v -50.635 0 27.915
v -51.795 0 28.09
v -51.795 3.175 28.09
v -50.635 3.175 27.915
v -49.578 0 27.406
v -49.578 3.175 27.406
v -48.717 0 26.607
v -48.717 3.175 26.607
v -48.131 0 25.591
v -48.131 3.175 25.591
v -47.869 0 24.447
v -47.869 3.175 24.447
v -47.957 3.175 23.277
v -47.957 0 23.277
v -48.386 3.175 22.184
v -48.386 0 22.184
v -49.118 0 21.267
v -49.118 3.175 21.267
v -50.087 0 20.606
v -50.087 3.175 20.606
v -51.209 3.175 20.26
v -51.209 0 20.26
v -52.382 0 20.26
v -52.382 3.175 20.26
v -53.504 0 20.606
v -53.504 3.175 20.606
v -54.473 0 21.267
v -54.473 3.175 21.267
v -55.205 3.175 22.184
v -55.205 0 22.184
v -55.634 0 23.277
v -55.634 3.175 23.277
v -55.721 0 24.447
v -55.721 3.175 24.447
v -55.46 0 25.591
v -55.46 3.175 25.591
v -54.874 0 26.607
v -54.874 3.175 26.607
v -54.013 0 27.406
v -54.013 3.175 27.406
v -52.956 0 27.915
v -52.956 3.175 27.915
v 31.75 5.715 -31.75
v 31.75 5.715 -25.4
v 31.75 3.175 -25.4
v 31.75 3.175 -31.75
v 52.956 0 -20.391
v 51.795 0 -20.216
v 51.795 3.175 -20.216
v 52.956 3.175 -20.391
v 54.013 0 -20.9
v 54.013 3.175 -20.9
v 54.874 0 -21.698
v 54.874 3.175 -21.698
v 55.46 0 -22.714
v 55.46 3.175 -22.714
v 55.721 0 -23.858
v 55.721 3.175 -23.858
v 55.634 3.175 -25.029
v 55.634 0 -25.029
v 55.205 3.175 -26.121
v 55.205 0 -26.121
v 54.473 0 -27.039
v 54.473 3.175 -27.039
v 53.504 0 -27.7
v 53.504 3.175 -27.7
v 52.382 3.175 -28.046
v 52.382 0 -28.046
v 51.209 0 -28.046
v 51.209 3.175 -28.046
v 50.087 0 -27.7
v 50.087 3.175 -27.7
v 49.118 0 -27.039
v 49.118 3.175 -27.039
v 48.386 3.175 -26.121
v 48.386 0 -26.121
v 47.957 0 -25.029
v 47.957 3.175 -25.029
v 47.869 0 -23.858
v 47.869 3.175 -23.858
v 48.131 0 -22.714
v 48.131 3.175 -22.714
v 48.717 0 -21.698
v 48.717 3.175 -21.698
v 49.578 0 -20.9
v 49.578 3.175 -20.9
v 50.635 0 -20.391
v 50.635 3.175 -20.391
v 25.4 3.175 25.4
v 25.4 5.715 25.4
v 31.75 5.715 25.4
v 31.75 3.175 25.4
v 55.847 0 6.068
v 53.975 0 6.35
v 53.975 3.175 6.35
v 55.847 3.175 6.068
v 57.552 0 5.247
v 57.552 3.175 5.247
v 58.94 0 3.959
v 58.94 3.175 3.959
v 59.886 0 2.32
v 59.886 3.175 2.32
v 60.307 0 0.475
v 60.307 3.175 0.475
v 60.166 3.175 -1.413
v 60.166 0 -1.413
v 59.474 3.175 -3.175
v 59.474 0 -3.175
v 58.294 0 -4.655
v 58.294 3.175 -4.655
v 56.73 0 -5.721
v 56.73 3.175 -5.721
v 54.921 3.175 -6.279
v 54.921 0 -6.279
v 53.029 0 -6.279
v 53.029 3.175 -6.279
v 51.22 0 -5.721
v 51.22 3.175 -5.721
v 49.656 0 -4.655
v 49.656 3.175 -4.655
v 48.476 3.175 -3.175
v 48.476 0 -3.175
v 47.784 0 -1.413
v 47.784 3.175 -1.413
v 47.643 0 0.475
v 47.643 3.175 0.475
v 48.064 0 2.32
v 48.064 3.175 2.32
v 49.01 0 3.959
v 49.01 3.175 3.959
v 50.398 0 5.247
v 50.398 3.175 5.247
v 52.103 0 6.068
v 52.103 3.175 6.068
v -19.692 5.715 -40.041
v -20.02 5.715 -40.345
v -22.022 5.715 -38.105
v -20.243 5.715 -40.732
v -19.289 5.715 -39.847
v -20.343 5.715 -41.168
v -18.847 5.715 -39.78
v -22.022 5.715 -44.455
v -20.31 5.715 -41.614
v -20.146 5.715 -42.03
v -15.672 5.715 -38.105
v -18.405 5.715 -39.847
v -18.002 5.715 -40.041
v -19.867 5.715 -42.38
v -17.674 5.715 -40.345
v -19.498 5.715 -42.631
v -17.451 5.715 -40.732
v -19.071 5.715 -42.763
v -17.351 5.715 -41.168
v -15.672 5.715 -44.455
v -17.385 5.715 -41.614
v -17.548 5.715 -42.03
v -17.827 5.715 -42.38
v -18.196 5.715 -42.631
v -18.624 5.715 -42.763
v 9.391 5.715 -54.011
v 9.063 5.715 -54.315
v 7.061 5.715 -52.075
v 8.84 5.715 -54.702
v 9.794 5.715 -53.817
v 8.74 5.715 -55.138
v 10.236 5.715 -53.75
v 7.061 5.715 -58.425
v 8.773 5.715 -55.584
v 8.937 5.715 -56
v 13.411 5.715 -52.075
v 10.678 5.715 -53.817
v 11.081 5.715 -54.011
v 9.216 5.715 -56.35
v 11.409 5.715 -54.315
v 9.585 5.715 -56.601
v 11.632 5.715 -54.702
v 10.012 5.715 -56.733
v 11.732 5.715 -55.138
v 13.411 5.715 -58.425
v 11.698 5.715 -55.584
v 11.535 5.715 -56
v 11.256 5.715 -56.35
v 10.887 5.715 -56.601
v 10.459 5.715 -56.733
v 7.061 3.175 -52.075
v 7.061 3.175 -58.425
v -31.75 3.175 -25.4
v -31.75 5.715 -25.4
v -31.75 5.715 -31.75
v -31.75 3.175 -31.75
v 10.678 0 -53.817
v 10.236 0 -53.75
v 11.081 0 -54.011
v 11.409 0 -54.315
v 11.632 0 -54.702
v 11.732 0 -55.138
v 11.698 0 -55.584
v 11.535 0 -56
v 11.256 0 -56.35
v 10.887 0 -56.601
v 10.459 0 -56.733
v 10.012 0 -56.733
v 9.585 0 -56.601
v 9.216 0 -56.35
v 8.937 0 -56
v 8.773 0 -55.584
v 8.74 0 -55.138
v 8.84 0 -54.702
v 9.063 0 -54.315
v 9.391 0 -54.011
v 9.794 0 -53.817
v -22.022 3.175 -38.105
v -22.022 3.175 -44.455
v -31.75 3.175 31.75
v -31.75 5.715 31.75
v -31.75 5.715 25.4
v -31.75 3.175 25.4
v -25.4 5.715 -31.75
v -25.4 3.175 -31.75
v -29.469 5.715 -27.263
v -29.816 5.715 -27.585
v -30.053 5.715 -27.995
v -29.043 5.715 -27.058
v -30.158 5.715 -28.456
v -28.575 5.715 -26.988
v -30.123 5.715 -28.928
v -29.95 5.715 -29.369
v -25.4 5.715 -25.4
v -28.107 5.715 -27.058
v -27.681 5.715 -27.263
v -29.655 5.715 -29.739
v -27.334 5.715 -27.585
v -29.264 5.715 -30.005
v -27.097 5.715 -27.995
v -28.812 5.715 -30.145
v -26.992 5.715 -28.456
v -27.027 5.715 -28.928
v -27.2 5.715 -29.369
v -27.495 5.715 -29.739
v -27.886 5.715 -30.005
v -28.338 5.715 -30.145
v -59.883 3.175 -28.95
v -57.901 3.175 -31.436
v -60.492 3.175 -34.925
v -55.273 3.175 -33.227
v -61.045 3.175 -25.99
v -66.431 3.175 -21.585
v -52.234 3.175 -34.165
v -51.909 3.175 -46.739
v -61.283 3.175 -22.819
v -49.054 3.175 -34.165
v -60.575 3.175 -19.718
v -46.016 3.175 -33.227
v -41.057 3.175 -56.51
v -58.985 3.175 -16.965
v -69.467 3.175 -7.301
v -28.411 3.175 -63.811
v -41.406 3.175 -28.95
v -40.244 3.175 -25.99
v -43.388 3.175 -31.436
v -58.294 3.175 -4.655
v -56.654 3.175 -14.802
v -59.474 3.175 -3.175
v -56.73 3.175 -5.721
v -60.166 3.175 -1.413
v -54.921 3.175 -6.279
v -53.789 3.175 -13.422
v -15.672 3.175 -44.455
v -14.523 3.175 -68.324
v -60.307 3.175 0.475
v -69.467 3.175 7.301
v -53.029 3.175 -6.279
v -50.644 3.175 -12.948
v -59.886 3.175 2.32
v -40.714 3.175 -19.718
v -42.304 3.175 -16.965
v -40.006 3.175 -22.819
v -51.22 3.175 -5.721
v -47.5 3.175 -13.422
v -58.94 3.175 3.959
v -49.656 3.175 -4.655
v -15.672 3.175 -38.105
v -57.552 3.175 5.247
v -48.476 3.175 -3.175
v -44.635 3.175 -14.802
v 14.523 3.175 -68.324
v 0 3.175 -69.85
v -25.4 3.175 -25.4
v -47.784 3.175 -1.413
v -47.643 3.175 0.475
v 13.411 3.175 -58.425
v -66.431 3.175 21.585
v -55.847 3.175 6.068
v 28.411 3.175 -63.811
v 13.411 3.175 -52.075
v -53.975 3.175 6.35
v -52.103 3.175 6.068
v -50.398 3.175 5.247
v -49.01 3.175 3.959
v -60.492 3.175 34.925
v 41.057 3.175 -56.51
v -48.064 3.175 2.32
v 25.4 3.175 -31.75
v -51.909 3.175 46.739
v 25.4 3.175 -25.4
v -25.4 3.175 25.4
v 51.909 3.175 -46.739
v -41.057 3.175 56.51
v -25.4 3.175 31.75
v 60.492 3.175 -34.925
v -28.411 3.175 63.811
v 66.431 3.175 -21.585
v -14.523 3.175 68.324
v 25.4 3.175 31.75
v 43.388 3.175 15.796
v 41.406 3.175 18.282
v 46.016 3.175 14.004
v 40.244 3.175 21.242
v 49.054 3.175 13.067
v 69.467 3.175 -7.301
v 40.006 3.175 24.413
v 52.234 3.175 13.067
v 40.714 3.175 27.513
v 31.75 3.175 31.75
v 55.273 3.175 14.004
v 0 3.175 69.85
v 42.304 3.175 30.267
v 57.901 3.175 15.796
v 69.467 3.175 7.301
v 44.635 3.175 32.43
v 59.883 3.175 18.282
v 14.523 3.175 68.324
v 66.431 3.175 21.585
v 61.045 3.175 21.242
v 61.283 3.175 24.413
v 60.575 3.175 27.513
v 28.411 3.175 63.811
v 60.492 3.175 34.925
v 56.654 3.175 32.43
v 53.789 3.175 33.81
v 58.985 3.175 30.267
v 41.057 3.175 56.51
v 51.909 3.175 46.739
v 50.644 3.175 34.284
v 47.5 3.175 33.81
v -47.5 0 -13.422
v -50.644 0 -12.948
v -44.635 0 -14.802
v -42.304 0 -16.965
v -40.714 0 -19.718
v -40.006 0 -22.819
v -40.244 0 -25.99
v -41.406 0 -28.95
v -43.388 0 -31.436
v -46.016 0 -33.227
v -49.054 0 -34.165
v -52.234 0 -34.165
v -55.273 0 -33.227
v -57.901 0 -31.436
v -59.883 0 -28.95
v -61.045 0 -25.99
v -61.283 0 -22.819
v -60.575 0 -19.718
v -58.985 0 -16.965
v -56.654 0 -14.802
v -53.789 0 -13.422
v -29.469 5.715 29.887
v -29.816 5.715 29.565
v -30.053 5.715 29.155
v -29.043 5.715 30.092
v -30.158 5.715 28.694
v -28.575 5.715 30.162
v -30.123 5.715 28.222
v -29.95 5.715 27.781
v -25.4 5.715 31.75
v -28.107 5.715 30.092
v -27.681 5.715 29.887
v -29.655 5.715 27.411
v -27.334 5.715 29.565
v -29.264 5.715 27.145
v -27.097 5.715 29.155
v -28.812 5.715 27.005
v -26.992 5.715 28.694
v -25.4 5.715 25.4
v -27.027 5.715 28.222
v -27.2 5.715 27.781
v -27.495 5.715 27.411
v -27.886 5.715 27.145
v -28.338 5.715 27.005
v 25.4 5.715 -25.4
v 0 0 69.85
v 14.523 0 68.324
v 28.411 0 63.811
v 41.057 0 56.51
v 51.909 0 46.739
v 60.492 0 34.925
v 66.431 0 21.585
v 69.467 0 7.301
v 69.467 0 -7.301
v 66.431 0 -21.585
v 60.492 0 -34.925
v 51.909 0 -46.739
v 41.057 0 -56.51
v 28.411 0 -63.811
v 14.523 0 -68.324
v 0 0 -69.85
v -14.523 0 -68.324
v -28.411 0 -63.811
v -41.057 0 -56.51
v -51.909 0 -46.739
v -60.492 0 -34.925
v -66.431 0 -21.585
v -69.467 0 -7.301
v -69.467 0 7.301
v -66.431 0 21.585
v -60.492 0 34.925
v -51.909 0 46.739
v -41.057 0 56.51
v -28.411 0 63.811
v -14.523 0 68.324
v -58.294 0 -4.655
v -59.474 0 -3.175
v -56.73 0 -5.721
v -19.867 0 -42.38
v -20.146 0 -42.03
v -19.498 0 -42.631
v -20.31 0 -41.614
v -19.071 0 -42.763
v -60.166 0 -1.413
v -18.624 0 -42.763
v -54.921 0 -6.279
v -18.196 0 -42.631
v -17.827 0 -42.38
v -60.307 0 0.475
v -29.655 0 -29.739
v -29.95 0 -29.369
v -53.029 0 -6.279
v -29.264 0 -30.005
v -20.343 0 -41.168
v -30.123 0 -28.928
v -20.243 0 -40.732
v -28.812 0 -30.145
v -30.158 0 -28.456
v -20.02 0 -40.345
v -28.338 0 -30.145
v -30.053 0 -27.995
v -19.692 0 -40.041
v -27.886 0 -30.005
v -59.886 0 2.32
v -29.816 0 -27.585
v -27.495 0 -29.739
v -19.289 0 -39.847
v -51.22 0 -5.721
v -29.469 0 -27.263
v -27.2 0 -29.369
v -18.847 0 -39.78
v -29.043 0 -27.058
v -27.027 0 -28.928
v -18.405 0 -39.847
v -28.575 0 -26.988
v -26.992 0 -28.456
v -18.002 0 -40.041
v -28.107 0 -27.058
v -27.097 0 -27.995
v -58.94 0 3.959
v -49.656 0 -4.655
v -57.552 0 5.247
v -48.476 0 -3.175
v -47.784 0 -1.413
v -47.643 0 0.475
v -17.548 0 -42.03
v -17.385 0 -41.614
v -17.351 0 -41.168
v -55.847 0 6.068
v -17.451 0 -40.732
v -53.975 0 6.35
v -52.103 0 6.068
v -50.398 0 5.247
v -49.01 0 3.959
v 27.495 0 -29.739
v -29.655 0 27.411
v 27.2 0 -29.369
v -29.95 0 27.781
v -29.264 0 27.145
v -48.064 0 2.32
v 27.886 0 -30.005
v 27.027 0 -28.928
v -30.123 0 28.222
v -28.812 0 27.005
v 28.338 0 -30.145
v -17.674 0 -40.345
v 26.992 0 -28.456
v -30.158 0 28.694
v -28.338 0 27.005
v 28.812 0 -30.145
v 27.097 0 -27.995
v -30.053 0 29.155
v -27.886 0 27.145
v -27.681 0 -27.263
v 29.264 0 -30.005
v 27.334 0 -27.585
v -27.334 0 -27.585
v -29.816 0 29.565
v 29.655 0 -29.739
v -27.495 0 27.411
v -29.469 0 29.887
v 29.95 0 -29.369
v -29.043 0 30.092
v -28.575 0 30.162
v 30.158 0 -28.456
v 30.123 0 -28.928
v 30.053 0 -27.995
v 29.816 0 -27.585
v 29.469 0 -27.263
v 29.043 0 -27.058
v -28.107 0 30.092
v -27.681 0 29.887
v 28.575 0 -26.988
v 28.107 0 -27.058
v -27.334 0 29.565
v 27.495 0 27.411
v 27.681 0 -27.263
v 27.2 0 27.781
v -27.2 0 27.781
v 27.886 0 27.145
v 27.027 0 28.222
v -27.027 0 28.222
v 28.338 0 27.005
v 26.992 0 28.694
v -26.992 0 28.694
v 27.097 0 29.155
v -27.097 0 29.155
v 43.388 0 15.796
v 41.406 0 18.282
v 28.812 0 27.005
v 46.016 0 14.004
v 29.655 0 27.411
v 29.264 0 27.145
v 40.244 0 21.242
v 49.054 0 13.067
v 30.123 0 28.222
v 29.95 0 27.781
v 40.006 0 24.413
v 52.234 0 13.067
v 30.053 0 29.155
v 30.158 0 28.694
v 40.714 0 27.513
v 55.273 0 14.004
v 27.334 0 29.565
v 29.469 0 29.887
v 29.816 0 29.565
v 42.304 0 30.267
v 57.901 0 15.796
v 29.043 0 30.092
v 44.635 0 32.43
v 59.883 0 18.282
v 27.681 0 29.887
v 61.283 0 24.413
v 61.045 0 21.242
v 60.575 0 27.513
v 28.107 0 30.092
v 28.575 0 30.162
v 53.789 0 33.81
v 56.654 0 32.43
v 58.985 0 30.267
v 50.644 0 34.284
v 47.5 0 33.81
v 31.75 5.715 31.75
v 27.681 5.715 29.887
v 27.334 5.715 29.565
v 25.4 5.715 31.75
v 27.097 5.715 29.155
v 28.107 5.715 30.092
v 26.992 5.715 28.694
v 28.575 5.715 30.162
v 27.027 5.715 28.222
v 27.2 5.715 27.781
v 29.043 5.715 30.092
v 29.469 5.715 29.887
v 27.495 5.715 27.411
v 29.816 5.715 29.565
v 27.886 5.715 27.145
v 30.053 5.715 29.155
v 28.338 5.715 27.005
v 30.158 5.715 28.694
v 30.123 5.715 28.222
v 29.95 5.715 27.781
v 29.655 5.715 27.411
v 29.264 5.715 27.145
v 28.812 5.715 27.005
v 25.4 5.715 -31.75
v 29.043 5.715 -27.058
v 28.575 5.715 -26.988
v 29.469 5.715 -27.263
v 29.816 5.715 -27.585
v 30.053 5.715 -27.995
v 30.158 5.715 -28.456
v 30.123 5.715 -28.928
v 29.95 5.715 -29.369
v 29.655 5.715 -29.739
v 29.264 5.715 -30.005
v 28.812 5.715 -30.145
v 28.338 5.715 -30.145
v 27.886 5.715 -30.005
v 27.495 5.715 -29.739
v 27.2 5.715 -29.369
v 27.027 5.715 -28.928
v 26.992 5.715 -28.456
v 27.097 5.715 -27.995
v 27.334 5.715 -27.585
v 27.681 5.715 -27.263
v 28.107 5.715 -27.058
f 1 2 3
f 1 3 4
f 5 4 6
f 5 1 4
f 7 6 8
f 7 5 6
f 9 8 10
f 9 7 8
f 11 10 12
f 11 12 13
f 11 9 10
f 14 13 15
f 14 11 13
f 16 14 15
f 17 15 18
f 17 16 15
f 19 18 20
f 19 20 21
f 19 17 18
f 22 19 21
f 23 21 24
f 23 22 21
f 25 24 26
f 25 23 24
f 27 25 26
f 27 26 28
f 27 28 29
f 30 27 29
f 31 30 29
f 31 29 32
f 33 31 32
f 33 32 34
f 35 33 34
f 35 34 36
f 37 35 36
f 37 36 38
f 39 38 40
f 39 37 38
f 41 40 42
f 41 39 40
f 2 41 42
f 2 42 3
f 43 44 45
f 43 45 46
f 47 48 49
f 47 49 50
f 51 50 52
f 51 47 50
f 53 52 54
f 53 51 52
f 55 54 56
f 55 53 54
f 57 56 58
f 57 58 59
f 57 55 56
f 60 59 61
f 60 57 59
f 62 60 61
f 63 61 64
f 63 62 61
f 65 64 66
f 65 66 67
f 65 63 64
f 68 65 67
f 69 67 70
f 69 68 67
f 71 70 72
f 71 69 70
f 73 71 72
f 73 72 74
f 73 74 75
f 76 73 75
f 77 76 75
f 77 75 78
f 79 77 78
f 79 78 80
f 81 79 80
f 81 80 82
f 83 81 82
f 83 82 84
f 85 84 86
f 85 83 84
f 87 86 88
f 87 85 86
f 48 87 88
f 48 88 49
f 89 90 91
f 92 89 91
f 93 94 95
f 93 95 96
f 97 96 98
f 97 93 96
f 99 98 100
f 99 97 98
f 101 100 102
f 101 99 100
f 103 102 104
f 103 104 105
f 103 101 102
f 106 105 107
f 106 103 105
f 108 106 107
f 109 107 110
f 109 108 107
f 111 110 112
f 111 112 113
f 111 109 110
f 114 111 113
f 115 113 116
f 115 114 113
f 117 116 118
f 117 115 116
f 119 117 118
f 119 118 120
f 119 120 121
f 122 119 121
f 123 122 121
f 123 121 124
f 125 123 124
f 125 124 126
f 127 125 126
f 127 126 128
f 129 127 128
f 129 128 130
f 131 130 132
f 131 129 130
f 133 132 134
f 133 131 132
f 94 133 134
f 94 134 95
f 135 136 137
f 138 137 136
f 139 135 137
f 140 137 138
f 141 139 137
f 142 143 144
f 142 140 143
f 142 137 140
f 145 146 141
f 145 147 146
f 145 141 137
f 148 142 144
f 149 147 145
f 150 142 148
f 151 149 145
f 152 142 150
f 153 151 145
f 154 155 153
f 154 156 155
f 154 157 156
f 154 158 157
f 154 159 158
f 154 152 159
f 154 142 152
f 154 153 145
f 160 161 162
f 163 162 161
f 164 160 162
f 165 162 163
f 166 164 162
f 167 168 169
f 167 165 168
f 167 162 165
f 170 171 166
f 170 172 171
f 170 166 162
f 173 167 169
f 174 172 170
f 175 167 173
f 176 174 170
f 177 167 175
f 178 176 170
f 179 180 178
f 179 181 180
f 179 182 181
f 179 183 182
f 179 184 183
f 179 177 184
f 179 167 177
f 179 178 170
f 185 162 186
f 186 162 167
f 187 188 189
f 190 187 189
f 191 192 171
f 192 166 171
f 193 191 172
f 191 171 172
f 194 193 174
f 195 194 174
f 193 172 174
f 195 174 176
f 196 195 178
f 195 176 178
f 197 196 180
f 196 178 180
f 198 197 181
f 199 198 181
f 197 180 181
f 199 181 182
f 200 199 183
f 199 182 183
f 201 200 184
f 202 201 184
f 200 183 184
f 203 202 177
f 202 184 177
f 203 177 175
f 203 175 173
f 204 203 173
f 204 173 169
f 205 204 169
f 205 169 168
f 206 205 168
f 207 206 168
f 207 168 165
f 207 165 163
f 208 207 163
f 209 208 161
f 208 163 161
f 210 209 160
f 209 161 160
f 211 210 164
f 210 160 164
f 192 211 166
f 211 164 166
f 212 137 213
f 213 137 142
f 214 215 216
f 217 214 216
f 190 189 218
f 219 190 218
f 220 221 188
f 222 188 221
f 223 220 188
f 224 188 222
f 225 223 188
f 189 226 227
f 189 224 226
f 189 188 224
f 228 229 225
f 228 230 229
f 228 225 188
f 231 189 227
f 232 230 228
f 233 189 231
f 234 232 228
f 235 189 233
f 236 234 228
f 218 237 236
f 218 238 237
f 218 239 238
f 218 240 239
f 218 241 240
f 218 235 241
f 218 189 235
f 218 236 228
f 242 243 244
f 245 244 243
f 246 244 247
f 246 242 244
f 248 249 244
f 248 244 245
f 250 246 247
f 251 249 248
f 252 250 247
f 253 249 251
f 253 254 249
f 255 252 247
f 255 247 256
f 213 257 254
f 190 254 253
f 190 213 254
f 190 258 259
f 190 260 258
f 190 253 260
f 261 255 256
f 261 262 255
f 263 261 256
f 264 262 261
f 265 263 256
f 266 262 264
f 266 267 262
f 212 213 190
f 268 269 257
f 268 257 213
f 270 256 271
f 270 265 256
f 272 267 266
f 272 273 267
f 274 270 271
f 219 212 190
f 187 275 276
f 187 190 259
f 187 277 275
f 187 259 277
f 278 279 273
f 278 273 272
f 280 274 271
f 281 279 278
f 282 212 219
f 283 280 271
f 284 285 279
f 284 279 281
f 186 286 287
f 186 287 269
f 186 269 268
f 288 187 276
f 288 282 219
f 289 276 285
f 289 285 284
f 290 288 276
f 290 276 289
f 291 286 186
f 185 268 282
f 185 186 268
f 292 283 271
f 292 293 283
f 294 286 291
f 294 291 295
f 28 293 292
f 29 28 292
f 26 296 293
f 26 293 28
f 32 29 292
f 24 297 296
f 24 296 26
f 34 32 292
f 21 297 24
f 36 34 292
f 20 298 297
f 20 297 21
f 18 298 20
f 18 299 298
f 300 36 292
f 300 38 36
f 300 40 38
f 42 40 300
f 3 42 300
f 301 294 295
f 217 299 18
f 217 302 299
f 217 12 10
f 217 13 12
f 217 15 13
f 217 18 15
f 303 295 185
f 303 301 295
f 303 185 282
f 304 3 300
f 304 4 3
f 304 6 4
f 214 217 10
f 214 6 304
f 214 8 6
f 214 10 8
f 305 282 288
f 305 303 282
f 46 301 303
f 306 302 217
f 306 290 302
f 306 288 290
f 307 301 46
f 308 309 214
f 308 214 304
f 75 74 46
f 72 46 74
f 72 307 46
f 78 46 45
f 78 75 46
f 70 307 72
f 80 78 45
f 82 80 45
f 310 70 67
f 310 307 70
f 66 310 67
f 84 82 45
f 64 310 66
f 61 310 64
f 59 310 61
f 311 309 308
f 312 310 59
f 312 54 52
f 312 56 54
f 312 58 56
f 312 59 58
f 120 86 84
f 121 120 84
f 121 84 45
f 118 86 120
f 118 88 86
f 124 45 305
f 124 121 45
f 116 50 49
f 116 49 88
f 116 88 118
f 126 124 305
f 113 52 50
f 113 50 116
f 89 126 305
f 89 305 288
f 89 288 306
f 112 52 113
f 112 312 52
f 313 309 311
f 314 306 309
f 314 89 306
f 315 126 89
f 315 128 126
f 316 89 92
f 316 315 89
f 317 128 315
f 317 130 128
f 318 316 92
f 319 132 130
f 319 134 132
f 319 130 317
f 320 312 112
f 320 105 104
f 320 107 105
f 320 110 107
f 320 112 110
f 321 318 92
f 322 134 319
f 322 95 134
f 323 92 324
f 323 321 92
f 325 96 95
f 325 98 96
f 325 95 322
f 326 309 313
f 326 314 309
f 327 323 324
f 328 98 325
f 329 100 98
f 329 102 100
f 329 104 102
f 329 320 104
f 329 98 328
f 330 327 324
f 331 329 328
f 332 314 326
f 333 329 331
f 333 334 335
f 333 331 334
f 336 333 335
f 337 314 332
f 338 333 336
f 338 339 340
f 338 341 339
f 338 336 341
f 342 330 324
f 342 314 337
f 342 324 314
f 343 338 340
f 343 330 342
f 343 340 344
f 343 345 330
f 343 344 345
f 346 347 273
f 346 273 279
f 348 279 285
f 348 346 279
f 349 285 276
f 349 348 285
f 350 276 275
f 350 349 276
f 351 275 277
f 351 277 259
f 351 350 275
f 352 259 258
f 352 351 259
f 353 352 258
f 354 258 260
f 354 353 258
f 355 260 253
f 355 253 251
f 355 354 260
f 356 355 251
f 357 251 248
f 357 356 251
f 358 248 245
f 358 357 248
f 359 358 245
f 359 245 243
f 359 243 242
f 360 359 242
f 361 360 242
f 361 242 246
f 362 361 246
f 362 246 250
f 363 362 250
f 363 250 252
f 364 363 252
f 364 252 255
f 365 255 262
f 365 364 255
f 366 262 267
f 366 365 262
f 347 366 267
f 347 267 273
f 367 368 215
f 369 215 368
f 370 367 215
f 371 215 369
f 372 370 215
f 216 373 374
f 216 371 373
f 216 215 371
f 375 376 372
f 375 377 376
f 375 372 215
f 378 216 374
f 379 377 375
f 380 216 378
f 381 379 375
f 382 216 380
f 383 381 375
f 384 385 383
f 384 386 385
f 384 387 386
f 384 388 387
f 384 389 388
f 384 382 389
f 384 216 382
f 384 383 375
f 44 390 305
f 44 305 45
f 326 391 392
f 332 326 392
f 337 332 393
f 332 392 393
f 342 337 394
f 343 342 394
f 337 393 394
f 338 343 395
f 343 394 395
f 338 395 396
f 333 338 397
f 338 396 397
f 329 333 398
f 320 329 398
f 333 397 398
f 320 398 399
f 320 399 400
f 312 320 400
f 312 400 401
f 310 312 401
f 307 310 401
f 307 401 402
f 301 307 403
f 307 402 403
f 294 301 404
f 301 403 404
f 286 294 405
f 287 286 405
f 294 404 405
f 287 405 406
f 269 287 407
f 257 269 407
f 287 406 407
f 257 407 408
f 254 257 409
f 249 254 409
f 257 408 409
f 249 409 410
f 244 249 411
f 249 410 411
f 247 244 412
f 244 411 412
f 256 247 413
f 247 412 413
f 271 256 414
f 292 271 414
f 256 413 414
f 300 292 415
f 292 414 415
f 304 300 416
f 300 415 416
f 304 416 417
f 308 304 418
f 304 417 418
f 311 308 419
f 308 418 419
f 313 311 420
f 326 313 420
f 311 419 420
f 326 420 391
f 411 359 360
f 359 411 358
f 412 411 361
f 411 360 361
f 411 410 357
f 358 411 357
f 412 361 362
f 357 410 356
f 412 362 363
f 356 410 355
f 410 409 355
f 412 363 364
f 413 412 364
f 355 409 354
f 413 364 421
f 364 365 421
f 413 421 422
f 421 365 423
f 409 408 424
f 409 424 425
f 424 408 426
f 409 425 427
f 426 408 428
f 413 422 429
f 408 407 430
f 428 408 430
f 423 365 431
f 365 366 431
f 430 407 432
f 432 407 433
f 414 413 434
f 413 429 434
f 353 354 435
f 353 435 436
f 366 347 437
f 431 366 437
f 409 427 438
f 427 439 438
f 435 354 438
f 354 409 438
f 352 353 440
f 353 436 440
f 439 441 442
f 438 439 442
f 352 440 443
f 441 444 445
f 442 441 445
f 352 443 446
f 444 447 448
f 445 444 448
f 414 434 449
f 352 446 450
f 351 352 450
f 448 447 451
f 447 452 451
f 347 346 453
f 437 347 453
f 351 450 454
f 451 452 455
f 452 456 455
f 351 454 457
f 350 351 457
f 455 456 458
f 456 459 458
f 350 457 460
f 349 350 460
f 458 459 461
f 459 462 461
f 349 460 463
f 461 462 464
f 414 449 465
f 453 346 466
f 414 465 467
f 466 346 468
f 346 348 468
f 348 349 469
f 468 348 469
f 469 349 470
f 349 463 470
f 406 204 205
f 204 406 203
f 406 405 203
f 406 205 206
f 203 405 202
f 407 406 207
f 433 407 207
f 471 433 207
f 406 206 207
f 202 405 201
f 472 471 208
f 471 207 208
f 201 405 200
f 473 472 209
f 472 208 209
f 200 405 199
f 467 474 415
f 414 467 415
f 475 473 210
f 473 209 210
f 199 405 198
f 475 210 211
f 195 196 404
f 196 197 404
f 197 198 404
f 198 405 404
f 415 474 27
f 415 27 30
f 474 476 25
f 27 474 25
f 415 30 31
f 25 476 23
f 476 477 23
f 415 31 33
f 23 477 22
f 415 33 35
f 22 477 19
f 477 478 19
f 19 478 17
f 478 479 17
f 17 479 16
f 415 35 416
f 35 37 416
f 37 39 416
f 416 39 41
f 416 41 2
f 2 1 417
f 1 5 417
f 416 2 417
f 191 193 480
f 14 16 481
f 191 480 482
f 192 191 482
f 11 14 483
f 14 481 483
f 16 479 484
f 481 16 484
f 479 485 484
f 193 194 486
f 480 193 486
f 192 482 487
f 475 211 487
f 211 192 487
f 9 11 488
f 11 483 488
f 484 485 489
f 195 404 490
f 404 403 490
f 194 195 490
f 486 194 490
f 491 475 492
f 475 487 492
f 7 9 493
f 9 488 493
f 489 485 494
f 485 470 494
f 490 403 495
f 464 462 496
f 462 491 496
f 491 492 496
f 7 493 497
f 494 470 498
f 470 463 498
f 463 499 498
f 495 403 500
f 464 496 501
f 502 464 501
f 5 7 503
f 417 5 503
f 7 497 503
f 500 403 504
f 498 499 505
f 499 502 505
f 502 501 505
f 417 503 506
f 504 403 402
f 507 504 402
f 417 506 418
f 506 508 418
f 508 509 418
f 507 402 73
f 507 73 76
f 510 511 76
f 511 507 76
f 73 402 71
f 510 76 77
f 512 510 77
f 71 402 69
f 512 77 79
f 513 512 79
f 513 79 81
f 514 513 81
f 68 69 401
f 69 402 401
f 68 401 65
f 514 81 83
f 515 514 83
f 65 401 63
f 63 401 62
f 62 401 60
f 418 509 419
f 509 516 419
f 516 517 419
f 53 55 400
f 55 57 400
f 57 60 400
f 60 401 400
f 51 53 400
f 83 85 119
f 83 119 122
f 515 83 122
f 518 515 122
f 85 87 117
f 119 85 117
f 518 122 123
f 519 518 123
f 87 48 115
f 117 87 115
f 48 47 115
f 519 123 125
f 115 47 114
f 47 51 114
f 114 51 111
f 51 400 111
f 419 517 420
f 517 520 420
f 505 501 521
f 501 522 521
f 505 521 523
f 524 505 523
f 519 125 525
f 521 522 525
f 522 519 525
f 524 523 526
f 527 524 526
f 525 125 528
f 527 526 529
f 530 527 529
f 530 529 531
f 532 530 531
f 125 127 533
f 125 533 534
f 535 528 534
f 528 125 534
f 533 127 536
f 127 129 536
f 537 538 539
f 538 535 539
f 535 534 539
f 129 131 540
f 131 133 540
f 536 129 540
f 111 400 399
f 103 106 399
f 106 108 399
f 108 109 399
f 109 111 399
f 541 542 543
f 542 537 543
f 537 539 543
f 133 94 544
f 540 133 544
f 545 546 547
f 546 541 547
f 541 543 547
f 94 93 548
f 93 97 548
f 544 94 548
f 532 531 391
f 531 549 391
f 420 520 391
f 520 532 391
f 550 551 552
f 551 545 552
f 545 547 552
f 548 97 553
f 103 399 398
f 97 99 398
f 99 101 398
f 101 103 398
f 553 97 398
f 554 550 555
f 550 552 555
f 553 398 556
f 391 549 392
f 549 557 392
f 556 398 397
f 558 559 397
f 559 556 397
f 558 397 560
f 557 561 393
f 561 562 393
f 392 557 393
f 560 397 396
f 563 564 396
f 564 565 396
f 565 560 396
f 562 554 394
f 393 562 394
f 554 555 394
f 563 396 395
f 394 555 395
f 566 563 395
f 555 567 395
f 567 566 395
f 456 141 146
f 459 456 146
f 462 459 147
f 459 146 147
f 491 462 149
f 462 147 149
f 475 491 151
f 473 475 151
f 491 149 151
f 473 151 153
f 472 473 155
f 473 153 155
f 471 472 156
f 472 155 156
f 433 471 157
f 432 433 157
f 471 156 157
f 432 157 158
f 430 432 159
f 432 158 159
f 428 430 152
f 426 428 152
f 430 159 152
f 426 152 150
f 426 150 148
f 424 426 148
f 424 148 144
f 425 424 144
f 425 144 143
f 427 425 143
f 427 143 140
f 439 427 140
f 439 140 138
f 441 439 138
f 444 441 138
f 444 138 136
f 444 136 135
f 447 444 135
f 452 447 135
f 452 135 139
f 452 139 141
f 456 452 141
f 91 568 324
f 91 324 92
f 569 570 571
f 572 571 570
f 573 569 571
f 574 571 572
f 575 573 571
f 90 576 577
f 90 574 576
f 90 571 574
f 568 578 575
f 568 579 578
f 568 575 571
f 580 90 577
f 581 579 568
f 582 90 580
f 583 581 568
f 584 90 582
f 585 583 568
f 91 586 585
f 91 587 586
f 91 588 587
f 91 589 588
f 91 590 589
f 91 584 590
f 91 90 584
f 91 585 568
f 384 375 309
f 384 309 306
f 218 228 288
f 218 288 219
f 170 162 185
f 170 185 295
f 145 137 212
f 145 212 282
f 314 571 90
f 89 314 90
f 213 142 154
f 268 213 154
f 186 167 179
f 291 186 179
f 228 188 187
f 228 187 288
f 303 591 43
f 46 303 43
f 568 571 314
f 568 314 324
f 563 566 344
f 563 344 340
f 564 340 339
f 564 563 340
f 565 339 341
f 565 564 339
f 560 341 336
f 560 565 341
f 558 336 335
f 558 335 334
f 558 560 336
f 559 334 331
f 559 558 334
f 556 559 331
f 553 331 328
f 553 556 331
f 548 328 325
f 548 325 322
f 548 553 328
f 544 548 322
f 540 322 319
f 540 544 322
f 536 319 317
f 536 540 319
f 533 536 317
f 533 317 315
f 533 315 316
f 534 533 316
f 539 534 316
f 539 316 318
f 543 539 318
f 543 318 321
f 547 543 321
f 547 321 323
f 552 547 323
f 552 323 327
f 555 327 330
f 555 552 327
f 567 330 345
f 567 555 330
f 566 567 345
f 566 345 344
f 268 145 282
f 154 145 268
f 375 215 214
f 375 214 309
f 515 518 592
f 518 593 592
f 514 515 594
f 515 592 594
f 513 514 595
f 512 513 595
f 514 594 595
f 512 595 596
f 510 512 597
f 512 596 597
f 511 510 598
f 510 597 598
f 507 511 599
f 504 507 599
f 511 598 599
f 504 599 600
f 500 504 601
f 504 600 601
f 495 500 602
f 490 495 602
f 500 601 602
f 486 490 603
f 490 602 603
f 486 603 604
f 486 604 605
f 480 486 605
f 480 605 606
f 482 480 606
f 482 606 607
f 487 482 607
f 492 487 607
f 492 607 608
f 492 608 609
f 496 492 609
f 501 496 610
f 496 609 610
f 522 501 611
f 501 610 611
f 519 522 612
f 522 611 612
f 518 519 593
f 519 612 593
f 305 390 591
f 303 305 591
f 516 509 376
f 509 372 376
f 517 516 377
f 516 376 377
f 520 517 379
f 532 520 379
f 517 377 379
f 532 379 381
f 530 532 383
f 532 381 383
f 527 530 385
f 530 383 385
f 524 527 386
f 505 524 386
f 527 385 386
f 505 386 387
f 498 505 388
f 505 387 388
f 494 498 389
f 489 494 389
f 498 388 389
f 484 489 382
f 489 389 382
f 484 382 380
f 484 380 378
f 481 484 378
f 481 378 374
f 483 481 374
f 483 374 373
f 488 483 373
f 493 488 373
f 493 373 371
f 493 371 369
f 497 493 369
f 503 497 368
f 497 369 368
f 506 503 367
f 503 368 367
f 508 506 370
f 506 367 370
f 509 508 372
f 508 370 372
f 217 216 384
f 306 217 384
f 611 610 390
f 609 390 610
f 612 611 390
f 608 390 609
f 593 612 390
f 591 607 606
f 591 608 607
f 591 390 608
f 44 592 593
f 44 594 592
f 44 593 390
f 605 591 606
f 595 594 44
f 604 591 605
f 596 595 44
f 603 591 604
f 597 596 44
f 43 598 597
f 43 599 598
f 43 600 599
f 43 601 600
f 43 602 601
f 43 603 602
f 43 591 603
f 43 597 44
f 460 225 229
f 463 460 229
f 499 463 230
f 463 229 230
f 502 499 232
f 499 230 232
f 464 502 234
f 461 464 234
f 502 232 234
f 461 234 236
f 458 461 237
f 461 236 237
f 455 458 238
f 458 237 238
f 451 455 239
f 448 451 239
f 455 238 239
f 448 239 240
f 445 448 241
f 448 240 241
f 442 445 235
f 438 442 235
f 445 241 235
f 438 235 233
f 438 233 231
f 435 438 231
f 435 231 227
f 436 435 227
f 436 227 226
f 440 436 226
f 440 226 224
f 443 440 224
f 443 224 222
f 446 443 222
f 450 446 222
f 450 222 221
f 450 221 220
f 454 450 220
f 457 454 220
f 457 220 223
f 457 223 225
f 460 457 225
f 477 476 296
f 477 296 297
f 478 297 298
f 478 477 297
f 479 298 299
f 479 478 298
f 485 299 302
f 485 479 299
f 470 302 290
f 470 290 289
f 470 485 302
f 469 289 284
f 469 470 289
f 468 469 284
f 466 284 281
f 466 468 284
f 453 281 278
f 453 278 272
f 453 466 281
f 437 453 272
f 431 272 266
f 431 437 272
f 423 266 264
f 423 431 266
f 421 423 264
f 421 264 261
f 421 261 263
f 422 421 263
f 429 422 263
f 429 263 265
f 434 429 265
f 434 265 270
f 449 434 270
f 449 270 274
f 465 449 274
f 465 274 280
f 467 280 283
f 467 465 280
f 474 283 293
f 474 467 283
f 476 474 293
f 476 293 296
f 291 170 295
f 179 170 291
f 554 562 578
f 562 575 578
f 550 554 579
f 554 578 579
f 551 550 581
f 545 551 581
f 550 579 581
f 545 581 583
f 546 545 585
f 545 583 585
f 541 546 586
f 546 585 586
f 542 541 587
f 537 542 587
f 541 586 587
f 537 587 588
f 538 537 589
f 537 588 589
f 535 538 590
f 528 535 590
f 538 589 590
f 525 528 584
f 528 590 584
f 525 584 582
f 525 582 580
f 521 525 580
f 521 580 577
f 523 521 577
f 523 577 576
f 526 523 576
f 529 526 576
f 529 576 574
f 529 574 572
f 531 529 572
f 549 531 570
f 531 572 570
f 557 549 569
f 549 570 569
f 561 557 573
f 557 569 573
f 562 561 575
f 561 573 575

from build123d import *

# Parameters (mm, degrees)
SKETCH1_R           = 69.85
SKETCH1_R_2         = 3.937
SKETCH1_R_3         = 6.35
SKETCH1_R_4         = 10.668
BOSS_EXTRUDE1_DEPTH = 3.175
SKETCH2_R           = 1.5875
CUT_EXTRUDE2_DEPTH  = 10
SKETCH2_4_R         = 1.5875
CUT_EXTRUDE3_DEPTH  = 10
BOSS_EXTRUDE3_START = 2.54
SKETCH2_5_W         = 6.35
SKETCH2_5_H         = 6.35
SKETCH2_5_R         = 1.5875
BOSS_EXTRUDE3_DEPTH = 2.54
SKETCH4_R           = 1.5
CUT_EXTRUDE4_DEPTH  = 6.35
BOSS_EXTRUDE4_START = 2.54
SKETCH4_4_W         = 6.35
SKETCH4_4_H         = 6.35
SKETCH4_4_R         = 1.5
BOSS_EXTRUDE4_DEPTH = 2.54


with BuildPart() as part:
    # Sketch1 → Boss-Extrude1 (new body)
    with BuildSketch(Plane(origin=(0, 0, 0), x_dir=(1, 0, 0), z_dir=(0, 1, 0))):
        Circle(SKETCH1_R)
        with Locations((-51.795490029, -24.152633658)):
            Circle(SKETCH1_R_2, mode=Mode.SUBTRACT)
        with Locations((-53.975, 0)):
            Circle(SKETCH1_R_3, mode=Mode.SUBTRACT)
        with Locations((-50.64447914, 23.615908466)):
            Circle(SKETCH1_R_4, mode=Mode.SUBTRACT)
        with Locations((51.795490029, 24.152633658)):
            Circle(SKETCH1_R_2, mode=Mode.SUBTRACT)
        with Locations((53.975, 0)):
            Circle(SKETCH1_R_3, mode=Mode.SUBTRACT)
        with Locations((50.64447914, -23.615908466)):
            Circle(SKETCH1_R_4, mode=Mode.SUBTRACT)
    extrude(amount=BOSS_EXTRUDE1_DEPTH)

    # Sketch2 → Cut-Extrude2 (cut)
    with BuildSketch(Plane(origin=(0, 3.175, 0), x_dir=(1, 0, 0), z_dir=(0, 1, 0))):
        with Locations((-28.575, -28.575)):
            Circle(SKETCH2_R)
    extrude(amount=-CUT_EXTRUDE2_DEPTH, mode=Mode.SUBTRACT)

    # Sketch2<4> → Cut-Extrude3 (cut)
    with BuildSketch(Plane(origin=(0, 3.175, 0), x_dir=(1, 0, 0), z_dir=(0, 1, 0))):
        with Locations((-28.575, 28.575)):
            Circle(SKETCH2_4_R)
        with Locations((28.575, 28.575)):
            Circle(SKETCH2_4_R)
        with Locations((28.575, -28.575)):
            Circle(SKETCH2_4_R)
    extrude(amount=-CUT_EXTRUDE3_DEPTH, mode=Mode.SUBTRACT)

    # Sketch2<5> → Boss-Extrude3 (add)
    # profile 1 of 4: a face of its own
    with BuildSketch(Plane(origin=(0, 3.175, 0), x_dir=(1, 0, 0), z_dir=(0, 1, 0)).offset(BOSS_EXTRUDE3_START)):
        with Locations((-28.575, 28.575)):
            Rectangle(SKETCH2_5_W, SKETCH2_5_H)
        with Locations((-28.575, 28.575)):
            Circle(SKETCH2_5_R, mode=Mode.SUBTRACT)
    # profile 2 of 4: a face of its own
    with BuildSketch(Plane(origin=(0, 3.175, 0), x_dir=(1, 0, 0), z_dir=(0, 1, 0)).offset(BOSS_EXTRUDE3_START)):
        with Locations((28.575, 28.575)):
            Rectangle(SKETCH2_5_W, SKETCH2_5_H)
        with Locations((28.575, 28.575)):
            Circle(SKETCH2_5_R, mode=Mode.SUBTRACT)
    # profile 3 of 4: a face of its own
    with BuildSketch(Plane(origin=(0, 3.175, 0), x_dir=(1, 0, 0), z_dir=(0, 1, 0)).offset(BOSS_EXTRUDE3_START)):
        with Locations((-28.575, -28.575)):
            Rectangle(SKETCH2_5_W, SKETCH2_5_H)
        with Locations((-28.575, -28.575)):
            Circle(SKETCH2_5_R, mode=Mode.SUBTRACT)
    # profile 4 of 4: a face of its own
    with BuildSketch(Plane(origin=(0, 3.175, 0), x_dir=(1, 0, 0), z_dir=(0, 1, 0)).offset(BOSS_EXTRUDE3_START)):
        with Locations((28.575, -28.575)):
            Rectangle(SKETCH2_5_W, SKETCH2_5_H)
        with Locations((28.575, -28.575)):
            Circle(SKETCH2_5_R, mode=Mode.SUBTRACT)
    extrude(amount=-BOSS_EXTRUDE3_DEPTH)

    # Sketch4 → Cut-Extrude4 (cut)
    with BuildSketch(Plane(origin=(0, 3.175, 0), x_dir=(1, 0, 0), z_dir=(0, 1, 0))):
        with Locations((10.235820896, 55.249992322)):
            Circle(SKETCH4_R)
        with Locations((-18.847179104, 41.279992322)):
            Circle(SKETCH4_R)
    extrude(amount=-CUT_EXTRUDE4_DEPTH, mode=Mode.SUBTRACT)

    # Sketch4<4> → Boss-Extrude4 (add)
    # profile 1 of 2: a face of its own
    with BuildSketch(Plane(origin=(0, 3.175, 0), x_dir=(1, 0, 0), z_dir=(0, 1, 0)).offset(BOSS_EXTRUDE4_START)):
        with Locations((-18.847179104, 41.279992322)):
            Rectangle(SKETCH4_4_W, SKETCH4_4_H)
        with Locations((-18.847179104, 41.279992322)):
            Circle(SKETCH4_4_R, mode=Mode.SUBTRACT)
    # profile 2 of 2: a face of its own
    with BuildSketch(Plane(origin=(0, 3.175, 0), x_dir=(1, 0, 0), z_dir=(0, 1, 0)).offset(BOSS_EXTRUDE4_START)):
        with Locations((10.235820896, 55.249992322)):
            Rectangle(SKETCH4_4_W, SKETCH4_4_H)
        with Locations((10.235820896, 55.249992322)):
            Circle(SKETCH4_4_R, mode=Mode.SUBTRACT)
    extrude(amount=-BOSS_EXTRUDE4_DEPTH)


solid = part.part
